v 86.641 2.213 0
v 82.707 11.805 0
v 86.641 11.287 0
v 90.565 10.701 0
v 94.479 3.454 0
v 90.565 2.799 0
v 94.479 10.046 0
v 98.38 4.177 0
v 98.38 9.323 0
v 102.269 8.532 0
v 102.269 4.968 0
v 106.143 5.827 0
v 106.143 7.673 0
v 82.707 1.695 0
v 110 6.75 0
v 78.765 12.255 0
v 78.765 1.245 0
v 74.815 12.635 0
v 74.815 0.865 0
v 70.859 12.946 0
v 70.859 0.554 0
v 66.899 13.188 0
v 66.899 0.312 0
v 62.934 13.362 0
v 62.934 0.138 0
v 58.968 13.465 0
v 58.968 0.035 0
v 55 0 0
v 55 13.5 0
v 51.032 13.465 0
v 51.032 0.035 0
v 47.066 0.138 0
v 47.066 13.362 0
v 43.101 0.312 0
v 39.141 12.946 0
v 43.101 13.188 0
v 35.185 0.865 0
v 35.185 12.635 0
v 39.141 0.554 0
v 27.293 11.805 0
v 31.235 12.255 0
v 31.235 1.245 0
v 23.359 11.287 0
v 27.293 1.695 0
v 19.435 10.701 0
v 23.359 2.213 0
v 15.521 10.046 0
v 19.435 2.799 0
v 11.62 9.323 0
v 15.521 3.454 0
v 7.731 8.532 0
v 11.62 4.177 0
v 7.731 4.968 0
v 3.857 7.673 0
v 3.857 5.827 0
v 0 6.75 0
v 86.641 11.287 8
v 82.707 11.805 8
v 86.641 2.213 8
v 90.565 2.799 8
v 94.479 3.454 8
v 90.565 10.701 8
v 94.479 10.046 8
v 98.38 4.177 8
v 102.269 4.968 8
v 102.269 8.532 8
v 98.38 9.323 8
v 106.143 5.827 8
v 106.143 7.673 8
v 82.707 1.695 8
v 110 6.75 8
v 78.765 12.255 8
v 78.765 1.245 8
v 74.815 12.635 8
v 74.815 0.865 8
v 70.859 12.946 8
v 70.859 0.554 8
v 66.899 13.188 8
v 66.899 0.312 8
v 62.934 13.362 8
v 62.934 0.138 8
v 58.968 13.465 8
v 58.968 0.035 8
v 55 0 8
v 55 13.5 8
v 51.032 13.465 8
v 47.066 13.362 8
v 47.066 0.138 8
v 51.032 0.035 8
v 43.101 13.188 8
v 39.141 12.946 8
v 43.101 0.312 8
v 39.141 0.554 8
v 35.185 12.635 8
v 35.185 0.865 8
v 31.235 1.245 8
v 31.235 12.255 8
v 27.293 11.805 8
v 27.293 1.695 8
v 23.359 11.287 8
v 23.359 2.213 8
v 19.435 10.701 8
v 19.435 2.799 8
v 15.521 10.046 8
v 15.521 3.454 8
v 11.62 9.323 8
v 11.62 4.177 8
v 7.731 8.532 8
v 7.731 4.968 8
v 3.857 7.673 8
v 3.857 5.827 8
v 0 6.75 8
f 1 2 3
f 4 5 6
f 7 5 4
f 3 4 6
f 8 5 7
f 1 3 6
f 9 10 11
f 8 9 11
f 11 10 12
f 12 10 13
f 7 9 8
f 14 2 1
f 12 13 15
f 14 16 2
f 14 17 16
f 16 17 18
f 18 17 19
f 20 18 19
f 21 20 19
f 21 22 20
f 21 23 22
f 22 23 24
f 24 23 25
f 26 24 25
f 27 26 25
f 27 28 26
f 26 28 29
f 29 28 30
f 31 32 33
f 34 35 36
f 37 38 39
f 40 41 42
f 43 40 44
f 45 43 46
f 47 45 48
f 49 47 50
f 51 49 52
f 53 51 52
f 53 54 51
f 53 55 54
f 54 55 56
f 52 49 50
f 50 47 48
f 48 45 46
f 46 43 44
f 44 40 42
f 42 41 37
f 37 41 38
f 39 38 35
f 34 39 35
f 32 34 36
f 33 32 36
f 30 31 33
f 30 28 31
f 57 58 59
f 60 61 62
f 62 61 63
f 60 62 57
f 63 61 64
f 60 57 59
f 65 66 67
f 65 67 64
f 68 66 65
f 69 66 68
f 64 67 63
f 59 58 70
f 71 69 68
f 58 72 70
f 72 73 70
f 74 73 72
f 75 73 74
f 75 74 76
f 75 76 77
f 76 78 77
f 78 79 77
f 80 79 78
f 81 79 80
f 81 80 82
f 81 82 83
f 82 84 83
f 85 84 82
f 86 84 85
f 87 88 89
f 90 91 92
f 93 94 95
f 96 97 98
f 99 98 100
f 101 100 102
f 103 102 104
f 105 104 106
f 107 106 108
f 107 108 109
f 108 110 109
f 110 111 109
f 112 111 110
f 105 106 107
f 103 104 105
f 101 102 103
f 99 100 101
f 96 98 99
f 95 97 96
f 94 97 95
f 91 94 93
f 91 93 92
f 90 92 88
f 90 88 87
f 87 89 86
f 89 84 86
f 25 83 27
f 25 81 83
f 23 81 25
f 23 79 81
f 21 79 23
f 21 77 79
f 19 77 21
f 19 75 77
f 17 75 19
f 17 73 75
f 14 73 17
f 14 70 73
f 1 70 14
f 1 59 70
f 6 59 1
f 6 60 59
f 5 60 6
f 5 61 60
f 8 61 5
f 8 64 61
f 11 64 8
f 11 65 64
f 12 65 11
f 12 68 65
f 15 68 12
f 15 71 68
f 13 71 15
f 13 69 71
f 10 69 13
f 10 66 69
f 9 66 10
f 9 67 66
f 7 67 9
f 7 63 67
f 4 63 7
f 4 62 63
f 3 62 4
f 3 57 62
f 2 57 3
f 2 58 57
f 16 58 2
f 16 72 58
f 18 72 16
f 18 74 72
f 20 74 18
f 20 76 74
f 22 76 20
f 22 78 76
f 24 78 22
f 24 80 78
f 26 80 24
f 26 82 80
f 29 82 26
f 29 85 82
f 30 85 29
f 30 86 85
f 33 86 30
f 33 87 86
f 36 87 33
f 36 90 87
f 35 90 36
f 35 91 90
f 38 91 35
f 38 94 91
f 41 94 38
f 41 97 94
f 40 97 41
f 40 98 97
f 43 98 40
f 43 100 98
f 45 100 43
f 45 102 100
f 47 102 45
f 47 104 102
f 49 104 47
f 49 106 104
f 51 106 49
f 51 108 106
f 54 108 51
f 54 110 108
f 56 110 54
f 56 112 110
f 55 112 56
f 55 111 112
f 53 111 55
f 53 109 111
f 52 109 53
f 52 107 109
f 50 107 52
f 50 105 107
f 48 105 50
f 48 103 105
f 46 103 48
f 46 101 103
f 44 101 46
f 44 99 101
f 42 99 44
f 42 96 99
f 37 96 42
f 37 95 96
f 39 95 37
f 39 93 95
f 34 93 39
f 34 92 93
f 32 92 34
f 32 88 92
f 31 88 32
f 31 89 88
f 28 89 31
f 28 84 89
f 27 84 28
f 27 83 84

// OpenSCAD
$fn = 32;

// ----------------------------------------------------------------------
// Arc profile plate: lens, 56 points
// ----------------------------------------------------------------------

// --- parameters (mm) ---
lens_chord = 110;         // chord length of the lens, X
arc_r = 227.35;           // radius of both arcs
arc_angle = 28;           // angle of each arc, degrees
sagitta = 6.75;           // bulge of each arc (half the lens height)
arc_step = 1;             // sampling step of the arcs, degrees
plate_t = 8;              // plate thickness, Z
fit_tol = 0.02;           // declared fit tolerance (prompt contract)
free_tol = 0.2;           // declared free tolerance (prompt contract)

bbox_y = 2 * sagitta;  // full lens height

profile = [[110, 6.75], [106.143, 7.673], [102.269, 8.532], [98.38, 9.323], [94.479, 10.046], [90.565, 10.701], [86.641, 11.287], [82.707, 11.805], [78.765, 12.255], [74.815, 12.635], [70.859, 12.946], [66.899, 13.188], [62.934, 13.362], [58.968, 13.465], [55, 13.5], [51.032, 13.465], [47.066, 13.362], [43.101, 13.188], [39.141, 12.946], [35.185, 12.635], [31.235, 12.255], [27.293, 11.805], [23.359, 11.287], [19.435, 10.701], [15.521, 10.046], [11.62, 9.323], [7.731, 8.532], [3.857, 7.673], [0, 6.75], [3.857, 5.827], [7.731, 4.968], [11.62, 4.177], [15.521, 3.454], [19.435, 2.799], [23.359, 2.213], [27.293, 1.695], [31.235, 1.245], [35.185, 0.865], [39.141, 0.554], [43.101, 0.312], [47.066, 0.138], [51.032, 0.035], [55, 0], [58.968, 0.035], [62.934, 0.138], [66.899, 0.312], [70.859, 0.554], [74.815, 0.865], [78.765, 1.245], [82.707, 1.695], [86.641, 2.213], [90.565, 2.799], [94.479, 3.454], [98.38, 4.177], [102.269, 4.968], [106.143, 5.827]];  // primary outline, 56 points, counter clockwise

// --- the one profile operation ---
linear_extrude(height = plate_t) polygon(points = profile);
